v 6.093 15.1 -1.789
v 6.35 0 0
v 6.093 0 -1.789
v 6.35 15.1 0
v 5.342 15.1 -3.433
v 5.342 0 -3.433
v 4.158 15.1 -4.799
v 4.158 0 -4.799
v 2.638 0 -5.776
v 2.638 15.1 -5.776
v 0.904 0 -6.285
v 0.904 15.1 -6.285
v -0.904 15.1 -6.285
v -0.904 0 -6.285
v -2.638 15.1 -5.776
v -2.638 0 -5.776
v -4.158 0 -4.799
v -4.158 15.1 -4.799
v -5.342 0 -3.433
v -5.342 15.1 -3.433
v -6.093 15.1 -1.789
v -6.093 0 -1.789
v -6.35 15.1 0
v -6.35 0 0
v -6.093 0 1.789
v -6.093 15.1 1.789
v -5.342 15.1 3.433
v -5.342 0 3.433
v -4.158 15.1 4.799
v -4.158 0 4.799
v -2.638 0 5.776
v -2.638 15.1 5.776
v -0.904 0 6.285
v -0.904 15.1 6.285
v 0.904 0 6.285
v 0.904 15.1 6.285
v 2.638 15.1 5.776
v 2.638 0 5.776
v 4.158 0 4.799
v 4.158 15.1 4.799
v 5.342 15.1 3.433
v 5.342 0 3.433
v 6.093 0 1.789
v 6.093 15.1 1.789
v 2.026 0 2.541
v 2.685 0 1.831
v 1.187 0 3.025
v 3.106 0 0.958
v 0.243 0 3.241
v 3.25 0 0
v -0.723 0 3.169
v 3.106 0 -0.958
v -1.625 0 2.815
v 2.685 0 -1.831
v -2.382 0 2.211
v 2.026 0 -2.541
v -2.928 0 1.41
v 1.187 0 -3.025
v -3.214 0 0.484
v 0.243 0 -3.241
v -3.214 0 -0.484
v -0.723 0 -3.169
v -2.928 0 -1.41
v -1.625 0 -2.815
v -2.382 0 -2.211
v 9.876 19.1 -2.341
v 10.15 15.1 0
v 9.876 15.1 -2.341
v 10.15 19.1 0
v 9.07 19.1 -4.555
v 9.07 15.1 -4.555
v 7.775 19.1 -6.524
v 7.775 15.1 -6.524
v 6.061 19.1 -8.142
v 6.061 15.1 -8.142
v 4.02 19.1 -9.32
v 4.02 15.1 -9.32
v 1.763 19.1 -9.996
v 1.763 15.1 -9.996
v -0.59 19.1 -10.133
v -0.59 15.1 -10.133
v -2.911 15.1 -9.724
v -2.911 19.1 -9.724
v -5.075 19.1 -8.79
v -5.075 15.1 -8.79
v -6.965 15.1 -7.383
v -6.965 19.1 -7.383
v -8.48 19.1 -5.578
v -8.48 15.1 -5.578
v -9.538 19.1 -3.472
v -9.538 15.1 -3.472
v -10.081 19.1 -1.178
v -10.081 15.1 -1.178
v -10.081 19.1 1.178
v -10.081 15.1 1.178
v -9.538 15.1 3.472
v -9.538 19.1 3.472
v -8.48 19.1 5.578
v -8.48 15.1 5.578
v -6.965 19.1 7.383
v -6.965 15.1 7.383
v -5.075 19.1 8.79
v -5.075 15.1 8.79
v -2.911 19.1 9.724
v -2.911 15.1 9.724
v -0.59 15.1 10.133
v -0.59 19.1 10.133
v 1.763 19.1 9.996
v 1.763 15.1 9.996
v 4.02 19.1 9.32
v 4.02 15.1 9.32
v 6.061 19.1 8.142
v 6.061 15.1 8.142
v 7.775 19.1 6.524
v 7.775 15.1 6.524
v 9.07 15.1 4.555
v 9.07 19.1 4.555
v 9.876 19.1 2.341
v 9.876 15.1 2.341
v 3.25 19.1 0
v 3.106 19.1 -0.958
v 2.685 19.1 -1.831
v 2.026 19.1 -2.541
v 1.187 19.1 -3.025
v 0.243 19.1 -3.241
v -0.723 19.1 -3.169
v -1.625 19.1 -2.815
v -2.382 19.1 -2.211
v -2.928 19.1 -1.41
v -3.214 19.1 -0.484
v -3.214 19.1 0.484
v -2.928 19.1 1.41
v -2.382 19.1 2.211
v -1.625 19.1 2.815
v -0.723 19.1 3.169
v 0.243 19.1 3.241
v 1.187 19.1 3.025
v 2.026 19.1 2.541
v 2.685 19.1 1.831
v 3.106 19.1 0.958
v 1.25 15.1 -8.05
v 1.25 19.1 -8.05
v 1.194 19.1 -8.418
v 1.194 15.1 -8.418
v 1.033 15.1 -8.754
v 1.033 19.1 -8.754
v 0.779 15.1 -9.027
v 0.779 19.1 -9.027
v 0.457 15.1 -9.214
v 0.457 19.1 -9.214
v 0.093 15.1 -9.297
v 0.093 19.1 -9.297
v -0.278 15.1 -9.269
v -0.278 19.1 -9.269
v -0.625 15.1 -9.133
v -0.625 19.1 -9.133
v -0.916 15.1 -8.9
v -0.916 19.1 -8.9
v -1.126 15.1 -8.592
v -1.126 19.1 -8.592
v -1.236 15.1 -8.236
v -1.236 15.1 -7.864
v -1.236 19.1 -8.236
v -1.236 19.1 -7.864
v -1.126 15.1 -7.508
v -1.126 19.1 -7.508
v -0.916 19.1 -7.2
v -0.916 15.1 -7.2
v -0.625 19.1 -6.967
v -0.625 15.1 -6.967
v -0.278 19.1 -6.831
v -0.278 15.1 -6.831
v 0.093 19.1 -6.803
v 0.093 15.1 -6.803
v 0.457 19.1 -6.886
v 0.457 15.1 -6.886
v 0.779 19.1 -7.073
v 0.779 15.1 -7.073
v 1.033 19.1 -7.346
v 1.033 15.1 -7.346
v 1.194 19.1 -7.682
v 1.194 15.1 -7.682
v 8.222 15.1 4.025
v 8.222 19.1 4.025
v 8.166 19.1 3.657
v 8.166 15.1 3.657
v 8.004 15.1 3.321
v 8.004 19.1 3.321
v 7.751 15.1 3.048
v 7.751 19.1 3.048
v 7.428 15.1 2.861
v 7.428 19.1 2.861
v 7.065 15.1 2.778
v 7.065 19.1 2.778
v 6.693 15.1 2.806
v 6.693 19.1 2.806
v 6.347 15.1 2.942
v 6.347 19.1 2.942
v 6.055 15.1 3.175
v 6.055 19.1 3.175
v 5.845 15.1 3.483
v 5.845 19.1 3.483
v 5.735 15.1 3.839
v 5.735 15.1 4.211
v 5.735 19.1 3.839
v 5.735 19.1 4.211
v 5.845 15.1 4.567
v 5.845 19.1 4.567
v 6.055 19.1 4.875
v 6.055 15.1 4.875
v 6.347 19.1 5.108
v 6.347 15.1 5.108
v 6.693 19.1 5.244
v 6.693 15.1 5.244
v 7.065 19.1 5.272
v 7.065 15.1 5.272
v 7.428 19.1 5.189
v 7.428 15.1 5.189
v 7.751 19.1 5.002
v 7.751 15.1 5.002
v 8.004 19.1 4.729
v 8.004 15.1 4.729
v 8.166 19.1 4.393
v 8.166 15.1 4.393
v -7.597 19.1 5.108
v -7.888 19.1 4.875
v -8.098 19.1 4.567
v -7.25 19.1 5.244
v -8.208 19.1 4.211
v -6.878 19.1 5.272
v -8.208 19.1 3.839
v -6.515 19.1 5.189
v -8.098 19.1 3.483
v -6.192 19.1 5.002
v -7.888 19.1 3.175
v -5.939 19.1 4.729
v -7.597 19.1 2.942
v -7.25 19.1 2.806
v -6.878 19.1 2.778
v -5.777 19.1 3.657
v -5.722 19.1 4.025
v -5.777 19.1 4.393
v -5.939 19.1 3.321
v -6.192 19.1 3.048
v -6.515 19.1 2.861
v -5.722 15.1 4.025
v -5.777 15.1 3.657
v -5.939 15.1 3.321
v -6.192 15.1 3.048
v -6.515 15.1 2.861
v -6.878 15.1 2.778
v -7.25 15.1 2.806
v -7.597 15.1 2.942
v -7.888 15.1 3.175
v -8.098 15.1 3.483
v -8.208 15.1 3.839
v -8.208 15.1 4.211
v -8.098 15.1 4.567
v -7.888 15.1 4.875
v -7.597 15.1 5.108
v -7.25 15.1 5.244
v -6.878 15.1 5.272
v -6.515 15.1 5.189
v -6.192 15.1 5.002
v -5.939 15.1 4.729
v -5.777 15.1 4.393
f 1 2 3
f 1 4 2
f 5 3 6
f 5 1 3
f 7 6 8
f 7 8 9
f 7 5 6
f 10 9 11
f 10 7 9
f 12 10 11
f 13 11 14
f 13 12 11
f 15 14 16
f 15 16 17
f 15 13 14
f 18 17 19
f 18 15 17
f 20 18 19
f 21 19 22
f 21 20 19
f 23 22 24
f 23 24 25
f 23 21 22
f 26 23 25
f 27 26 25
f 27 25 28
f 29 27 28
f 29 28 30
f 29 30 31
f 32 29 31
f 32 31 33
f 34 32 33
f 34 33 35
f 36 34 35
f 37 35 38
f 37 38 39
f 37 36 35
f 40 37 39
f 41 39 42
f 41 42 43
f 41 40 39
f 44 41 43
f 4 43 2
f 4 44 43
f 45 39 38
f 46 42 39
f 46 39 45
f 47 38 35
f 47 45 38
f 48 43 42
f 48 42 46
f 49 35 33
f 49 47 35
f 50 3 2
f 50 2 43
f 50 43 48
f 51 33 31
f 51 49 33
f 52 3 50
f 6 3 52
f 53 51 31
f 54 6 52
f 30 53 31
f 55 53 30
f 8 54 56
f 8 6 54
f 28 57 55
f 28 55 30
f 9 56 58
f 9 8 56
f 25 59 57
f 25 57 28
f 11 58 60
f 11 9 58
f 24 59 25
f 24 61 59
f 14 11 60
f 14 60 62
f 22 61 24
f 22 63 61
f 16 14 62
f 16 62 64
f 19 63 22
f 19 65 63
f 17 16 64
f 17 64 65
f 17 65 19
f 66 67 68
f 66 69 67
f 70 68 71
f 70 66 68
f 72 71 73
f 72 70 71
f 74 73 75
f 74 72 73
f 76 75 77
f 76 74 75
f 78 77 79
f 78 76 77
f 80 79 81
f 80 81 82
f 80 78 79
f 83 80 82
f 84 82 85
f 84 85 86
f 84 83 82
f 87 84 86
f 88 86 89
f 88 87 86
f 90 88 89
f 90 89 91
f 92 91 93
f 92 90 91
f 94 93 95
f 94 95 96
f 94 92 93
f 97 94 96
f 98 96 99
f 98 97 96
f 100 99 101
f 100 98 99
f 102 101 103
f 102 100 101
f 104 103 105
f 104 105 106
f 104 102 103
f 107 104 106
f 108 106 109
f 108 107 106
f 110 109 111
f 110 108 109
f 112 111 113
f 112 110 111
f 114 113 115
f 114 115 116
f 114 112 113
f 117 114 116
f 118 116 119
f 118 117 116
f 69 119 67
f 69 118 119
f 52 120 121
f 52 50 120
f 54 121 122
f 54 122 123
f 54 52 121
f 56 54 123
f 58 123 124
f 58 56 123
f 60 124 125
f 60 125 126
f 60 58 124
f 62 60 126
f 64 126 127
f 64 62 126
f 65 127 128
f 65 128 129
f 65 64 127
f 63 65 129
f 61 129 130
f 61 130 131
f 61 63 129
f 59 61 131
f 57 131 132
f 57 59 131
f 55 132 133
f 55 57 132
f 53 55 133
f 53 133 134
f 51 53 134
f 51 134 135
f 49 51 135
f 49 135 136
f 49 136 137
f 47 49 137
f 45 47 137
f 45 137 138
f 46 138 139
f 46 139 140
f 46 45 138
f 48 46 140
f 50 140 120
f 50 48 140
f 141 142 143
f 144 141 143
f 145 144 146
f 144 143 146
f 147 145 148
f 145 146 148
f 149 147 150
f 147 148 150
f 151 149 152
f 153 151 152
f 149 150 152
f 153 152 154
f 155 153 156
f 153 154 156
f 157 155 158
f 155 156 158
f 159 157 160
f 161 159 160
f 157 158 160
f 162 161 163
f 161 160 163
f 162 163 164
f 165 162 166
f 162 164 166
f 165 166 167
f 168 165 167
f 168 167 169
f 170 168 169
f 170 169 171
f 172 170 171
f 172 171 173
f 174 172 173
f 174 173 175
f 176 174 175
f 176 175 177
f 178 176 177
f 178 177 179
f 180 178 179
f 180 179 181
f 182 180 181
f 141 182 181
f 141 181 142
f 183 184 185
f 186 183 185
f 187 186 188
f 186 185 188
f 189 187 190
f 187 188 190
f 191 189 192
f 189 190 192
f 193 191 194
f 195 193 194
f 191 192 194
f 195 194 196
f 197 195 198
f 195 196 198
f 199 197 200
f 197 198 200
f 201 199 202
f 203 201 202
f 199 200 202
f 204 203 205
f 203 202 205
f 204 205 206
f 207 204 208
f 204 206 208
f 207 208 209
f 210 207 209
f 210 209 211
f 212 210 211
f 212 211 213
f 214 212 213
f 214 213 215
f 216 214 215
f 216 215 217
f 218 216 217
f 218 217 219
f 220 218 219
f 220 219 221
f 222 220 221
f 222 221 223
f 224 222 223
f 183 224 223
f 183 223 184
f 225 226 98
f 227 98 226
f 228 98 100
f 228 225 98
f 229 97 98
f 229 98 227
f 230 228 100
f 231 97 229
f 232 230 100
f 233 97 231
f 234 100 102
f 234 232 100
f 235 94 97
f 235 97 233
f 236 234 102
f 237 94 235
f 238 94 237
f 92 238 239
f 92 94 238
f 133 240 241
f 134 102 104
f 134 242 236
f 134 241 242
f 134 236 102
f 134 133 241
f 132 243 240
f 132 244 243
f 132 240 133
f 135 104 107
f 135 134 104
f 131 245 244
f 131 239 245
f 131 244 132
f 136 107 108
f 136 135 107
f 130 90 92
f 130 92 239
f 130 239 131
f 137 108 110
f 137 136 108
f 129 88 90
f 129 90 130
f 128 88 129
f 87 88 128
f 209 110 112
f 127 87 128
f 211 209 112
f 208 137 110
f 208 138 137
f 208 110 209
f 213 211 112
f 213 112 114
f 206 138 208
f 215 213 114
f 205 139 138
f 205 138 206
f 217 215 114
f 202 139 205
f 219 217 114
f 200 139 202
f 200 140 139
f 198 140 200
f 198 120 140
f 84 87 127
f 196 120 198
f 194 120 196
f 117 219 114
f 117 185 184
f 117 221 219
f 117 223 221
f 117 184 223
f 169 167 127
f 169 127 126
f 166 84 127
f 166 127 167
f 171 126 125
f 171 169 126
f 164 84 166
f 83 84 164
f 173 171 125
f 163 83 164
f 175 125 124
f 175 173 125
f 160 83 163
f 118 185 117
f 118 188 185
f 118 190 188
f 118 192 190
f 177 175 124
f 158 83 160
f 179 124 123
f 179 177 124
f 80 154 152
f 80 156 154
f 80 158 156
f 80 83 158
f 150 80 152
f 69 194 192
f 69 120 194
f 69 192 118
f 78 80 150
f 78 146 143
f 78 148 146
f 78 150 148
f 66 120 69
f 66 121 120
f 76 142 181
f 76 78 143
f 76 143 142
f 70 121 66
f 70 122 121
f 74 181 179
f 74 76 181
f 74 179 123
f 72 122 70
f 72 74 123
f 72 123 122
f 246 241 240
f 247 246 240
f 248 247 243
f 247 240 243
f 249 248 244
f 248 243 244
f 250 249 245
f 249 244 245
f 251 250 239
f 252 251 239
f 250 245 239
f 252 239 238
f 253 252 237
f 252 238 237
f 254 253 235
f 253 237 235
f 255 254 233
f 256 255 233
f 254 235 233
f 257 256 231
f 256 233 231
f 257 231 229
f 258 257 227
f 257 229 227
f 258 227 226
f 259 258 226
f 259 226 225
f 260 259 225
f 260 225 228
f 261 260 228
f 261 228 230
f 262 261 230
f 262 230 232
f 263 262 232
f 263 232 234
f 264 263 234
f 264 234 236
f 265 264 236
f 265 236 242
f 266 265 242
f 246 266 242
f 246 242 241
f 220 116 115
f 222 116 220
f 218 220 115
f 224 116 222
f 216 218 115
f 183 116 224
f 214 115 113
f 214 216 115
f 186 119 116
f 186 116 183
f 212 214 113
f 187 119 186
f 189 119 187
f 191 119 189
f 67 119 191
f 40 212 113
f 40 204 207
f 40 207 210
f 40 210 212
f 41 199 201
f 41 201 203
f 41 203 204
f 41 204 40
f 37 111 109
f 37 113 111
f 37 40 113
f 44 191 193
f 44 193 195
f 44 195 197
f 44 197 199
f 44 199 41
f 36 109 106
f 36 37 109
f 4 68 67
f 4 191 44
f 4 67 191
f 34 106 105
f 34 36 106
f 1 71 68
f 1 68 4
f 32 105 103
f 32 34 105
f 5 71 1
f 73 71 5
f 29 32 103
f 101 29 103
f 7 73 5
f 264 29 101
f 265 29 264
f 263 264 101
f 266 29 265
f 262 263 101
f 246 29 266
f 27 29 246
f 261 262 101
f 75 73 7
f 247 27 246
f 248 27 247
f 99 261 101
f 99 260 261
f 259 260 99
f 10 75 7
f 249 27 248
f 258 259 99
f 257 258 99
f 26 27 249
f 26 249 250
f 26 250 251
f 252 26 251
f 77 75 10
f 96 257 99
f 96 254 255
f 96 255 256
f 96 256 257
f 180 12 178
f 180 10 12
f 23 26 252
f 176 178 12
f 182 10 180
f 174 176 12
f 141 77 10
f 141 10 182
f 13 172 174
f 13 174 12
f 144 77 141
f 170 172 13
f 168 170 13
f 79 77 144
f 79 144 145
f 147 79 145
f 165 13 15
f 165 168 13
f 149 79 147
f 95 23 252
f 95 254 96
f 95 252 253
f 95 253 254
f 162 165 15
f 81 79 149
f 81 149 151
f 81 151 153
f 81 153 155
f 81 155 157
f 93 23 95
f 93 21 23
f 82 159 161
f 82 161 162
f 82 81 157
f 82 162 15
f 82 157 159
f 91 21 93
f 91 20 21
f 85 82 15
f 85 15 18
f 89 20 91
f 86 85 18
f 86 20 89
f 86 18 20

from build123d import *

# Parameters (mm, degrees)
CORTAR_EXTRUIR1_REACH     = 21.1
CROQUIS2_R                = 1.25
TALADRO_ROSCADO_M31_D     = 2.5
TALADRO_ROSCADO_M31_DEPTH = 8.5
TALADRO_ROSCADO_M31_TIP   = 0.751075774


with BuildPart() as part:
    # Croquis1 → Revolución1 (revolve)
    with BuildSketch(Plane.XY):
        Polygon((6.35, 0), (6.35, 15.1), (10.15, 15.1), (10.15, 19.1), (3.25, 19.1), (3.25, 0), align=None)
    revolve(axis=Axis((0, 0, 0), (0, 1, 0)))

    # Croquis2 → Cortar-Extruir1 (cut, up to next)
    with BuildSketch(Plane(origin=(0, 19.1, 0), x_dir=(1, 0, 0), z_dir=(0, 1, 0)), mode=Mode.PRIVATE) as cortar_extruir1_sk1:
        with Locations((6.9715045, -4.025)):
            Circle(CROQUIS2_R)
    cortar_extruir1_tool1 = extrude(cortar_extruir1_sk1.sketch, amount=-CORTAR_EXTRUIR1_REACH, mode=Mode.PRIVATE) & part.part
    add(cortar_extruir1_tool1.solids().sort_by_distance((6.971505, 19.1, 4.025))[0], mode=Mode.SUBTRACT)
    # Croquis2 → Cortar-Extruir1 (cut, up to next)
    with BuildSketch(Plane(origin=(0, 19.1, 0), x_dir=(1, 0, 0), z_dir=(0, 1, 0)), mode=Mode.PRIVATE) as cortar_extruir1_sk2:
        with Locations((0, 8.05)):
            Circle(CROQUIS2_R)
    cortar_extruir1_tool2 = extrude(cortar_extruir1_sk2.sketch, amount=-CORTAR_EXTRUIR1_REACH, mode=Mode.PRIVATE) & part.part
    add(cortar_extruir1_tool2.solids().sort_by_distance((0, 19.1, -8.05))[0], mode=Mode.SUBTRACT)
    # Croquis2 → Cortar-Extruir1 (cut, up to next)
    with BuildSketch(Plane(origin=(0, 19.1, 0), x_dir=(1, 0, 0), z_dir=(0, 1, 0)), mode=Mode.PRIVATE) as cortar_extruir1_sk3:
        with Locations((-6.9715045, -4.025)):
            Circle(CROQUIS2_R)
    cortar_extruir1_tool3 = extrude(cortar_extruir1_sk3.sketch, amount=-CORTAR_EXTRUIR1_REACH, mode=Mode.PRIVATE) & part.part
    add(cortar_extruir1_tool3.solids().sort_by_distance((-6.971505, 19.1, 4.025))[0], mode=Mode.SUBTRACT)

    # Taladro roscado M31
    with Locations(Plane(origin=(0, 15.1, -8.05), x_dir=(0, 0, -1), z_dir=(0, -1, 0))):
        with Locations((0, 0), (-12.075, 6.9715045), (-12.075, -6.9715045)):
            Hole(TALADRO_ROSCADO_M31_D / 2, depth=TALADRO_ROSCADO_M31_DEPTH)
            with Locations((0, 0, -(TALADRO_ROSCADO_M31_DEPTH + TALADRO_ROSCADO_M31_TIP / 2))):  # 118° drill point
                Cone(0, TALADRO_ROSCADO_M31_D / 2, TALADRO_ROSCADO_M31_TIP, mode=Mode.SUBTRACT)


solid = part.part
